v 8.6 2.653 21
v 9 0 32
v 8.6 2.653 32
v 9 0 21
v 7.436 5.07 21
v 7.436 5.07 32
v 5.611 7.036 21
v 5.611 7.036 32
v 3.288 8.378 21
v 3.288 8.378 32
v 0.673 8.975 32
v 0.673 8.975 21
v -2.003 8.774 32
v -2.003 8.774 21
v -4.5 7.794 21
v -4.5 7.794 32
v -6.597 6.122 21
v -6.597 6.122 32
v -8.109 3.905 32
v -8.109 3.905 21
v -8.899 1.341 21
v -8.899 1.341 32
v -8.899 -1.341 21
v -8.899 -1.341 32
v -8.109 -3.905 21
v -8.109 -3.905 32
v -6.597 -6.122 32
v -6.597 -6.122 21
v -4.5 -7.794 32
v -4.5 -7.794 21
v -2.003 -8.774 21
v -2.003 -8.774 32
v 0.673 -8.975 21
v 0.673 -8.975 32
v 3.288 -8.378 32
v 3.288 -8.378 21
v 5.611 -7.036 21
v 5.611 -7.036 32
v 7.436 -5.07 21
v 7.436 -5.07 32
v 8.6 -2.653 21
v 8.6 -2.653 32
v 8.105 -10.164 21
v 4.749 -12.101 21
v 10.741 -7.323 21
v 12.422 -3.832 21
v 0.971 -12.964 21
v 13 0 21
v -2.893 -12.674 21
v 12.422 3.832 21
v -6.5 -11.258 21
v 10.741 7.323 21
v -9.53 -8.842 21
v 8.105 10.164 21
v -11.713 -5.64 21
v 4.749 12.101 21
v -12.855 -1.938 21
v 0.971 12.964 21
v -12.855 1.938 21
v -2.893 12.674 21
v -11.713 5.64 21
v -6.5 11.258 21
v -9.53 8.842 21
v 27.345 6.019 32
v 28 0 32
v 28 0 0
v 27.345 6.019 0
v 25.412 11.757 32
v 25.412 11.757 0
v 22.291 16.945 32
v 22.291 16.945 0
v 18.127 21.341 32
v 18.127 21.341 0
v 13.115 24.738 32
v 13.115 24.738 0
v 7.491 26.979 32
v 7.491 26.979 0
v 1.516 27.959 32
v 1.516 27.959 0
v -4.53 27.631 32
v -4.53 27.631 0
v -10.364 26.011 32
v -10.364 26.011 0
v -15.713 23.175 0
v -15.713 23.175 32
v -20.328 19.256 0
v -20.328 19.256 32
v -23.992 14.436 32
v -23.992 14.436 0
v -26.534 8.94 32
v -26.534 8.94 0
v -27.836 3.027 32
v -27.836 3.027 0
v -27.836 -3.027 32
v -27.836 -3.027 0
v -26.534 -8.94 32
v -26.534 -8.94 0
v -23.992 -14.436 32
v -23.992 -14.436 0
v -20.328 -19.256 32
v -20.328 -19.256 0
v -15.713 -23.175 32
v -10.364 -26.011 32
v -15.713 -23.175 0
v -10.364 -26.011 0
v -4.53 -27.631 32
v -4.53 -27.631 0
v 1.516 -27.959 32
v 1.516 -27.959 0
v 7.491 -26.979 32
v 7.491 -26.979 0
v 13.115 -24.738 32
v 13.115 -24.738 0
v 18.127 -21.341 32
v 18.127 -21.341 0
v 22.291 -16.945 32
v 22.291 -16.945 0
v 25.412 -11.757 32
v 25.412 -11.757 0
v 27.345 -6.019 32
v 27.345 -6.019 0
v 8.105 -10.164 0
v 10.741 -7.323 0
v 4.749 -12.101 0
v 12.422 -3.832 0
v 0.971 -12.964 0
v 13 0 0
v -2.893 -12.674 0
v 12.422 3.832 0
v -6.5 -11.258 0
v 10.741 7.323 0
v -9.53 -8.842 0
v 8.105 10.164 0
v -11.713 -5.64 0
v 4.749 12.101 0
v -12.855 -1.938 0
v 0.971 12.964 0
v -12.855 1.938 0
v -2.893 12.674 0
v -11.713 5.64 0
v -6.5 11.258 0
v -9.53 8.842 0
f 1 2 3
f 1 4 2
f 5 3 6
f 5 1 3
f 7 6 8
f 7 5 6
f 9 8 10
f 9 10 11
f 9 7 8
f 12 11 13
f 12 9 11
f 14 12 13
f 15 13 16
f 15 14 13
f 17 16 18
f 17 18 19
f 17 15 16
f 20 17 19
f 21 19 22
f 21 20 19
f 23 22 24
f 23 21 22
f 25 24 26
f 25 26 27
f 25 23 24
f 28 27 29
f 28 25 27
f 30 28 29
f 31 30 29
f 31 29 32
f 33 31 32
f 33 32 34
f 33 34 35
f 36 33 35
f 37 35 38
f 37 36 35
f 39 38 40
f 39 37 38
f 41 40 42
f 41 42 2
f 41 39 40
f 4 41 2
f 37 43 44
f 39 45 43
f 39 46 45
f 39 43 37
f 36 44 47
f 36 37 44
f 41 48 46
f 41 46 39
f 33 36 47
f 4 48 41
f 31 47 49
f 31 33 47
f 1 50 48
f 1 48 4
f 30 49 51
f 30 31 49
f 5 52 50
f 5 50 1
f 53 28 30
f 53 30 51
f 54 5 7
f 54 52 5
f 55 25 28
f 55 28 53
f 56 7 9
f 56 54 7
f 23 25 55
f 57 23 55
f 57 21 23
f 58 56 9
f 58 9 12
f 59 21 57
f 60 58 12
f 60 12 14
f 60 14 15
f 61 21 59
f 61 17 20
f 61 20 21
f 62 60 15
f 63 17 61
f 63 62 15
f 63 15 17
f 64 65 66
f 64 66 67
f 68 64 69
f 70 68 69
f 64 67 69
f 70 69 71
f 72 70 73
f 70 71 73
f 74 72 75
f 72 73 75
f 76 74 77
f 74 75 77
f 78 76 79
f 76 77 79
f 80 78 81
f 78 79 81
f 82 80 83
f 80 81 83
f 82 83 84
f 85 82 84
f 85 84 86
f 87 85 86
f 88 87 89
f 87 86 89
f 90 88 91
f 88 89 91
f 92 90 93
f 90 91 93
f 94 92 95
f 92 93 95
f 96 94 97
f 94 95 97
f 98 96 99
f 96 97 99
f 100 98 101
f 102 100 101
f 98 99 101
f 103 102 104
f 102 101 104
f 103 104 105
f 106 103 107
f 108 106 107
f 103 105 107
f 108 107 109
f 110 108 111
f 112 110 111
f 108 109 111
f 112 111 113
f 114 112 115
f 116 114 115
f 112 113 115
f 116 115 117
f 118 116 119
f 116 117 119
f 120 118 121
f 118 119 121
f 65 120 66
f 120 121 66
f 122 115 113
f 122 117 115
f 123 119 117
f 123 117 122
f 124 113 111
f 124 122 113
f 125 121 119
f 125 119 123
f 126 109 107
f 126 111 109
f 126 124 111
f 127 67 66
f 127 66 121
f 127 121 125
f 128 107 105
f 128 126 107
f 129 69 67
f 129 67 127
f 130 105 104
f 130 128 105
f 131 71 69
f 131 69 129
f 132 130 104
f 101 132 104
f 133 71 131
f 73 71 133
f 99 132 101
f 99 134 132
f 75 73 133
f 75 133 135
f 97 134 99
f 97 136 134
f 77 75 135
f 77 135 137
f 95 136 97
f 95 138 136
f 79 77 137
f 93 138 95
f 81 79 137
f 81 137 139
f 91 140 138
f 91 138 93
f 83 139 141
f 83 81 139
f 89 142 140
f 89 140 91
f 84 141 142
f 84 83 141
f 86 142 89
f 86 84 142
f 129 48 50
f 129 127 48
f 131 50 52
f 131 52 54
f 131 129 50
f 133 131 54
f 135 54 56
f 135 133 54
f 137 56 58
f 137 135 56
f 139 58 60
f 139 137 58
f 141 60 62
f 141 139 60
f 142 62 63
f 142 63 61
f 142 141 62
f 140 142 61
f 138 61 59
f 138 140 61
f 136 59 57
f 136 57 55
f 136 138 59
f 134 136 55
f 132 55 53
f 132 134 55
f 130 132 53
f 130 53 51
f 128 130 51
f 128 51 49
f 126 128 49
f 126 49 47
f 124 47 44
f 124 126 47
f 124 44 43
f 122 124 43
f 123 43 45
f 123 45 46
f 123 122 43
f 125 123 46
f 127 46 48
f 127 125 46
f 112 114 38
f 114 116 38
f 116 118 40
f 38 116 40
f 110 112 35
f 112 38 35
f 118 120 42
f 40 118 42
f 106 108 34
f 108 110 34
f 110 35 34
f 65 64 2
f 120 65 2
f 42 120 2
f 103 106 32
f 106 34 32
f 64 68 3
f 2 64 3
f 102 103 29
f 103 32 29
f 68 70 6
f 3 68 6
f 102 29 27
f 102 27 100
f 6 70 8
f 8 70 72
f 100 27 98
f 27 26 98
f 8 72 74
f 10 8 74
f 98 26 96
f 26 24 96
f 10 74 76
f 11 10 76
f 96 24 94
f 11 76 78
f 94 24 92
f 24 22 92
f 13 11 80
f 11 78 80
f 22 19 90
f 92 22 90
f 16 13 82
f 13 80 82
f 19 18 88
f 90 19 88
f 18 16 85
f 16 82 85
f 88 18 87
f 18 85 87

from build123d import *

# Parameters (mm, degrees)
SZKIC1_W                    = 32
SZKIC1_H                    = 28
SZKIC3_R                    = 21
DODANIE_WYCI_GNI_CIE1_DEPTH = 14


# Read off the part's stored shape, not the designer's step: Usuń ścianę1
with BuildPart() as part:
    # Szkic1 → Obrót1 (revolve)
    with BuildSketch(Plane(origin=(0, 0, 0), x_dir=(0, 0, -1), z_dir=(1, 0, 0)), mode=Mode.PRIVATE) as obr_t1_sk:
        with Locations((-16, 14)):
            Rectangle(SZKIC1_W, SZKIC1_H)
    revolve(obr_t1_sk.sketch.rotate(Axis((0, 0, 0), (0, 0, 1)), 270), axis=Axis((0, 0, 0), (0, 0, 1)))

    # Szkic2 → Wycięcie-obrót1 (revolve, cut)
    with BuildSketch(Plane(origin=(0, 0, 0), x_dir=(0, 0, -1), z_dir=(1, 0, 0)), mode=Mode.PRIVATE) as wyci_cie_obr_t1_sk:
        Polygon((-32, 0), (-32, 9), (-21, 9), (-21, 13), (0, 13), (0, 0), align=None)
    revolve(wyci_cie_obr_t1_sk.sketch.rotate(Axis((0, 0, 0), (0, 0, 1)), 270), axis=Axis((0, 0, 0), (0, 0, 1)), mode=Mode.SUBTRACT)


with BuildPart() as body_2:
    # Szkic3 → Dodanie-wyciągnięcie1 (new body)
    with BuildSketch(Plane(origin=(0, 0, 0), x_dir=(0, 0, -1), z_dir=(1, 0, 0))):
        Circle(SZKIC3_R)
    extrude(amount=DODANIE_WYCI_GNI_CIE1_DEPTH)


solid = part.part
